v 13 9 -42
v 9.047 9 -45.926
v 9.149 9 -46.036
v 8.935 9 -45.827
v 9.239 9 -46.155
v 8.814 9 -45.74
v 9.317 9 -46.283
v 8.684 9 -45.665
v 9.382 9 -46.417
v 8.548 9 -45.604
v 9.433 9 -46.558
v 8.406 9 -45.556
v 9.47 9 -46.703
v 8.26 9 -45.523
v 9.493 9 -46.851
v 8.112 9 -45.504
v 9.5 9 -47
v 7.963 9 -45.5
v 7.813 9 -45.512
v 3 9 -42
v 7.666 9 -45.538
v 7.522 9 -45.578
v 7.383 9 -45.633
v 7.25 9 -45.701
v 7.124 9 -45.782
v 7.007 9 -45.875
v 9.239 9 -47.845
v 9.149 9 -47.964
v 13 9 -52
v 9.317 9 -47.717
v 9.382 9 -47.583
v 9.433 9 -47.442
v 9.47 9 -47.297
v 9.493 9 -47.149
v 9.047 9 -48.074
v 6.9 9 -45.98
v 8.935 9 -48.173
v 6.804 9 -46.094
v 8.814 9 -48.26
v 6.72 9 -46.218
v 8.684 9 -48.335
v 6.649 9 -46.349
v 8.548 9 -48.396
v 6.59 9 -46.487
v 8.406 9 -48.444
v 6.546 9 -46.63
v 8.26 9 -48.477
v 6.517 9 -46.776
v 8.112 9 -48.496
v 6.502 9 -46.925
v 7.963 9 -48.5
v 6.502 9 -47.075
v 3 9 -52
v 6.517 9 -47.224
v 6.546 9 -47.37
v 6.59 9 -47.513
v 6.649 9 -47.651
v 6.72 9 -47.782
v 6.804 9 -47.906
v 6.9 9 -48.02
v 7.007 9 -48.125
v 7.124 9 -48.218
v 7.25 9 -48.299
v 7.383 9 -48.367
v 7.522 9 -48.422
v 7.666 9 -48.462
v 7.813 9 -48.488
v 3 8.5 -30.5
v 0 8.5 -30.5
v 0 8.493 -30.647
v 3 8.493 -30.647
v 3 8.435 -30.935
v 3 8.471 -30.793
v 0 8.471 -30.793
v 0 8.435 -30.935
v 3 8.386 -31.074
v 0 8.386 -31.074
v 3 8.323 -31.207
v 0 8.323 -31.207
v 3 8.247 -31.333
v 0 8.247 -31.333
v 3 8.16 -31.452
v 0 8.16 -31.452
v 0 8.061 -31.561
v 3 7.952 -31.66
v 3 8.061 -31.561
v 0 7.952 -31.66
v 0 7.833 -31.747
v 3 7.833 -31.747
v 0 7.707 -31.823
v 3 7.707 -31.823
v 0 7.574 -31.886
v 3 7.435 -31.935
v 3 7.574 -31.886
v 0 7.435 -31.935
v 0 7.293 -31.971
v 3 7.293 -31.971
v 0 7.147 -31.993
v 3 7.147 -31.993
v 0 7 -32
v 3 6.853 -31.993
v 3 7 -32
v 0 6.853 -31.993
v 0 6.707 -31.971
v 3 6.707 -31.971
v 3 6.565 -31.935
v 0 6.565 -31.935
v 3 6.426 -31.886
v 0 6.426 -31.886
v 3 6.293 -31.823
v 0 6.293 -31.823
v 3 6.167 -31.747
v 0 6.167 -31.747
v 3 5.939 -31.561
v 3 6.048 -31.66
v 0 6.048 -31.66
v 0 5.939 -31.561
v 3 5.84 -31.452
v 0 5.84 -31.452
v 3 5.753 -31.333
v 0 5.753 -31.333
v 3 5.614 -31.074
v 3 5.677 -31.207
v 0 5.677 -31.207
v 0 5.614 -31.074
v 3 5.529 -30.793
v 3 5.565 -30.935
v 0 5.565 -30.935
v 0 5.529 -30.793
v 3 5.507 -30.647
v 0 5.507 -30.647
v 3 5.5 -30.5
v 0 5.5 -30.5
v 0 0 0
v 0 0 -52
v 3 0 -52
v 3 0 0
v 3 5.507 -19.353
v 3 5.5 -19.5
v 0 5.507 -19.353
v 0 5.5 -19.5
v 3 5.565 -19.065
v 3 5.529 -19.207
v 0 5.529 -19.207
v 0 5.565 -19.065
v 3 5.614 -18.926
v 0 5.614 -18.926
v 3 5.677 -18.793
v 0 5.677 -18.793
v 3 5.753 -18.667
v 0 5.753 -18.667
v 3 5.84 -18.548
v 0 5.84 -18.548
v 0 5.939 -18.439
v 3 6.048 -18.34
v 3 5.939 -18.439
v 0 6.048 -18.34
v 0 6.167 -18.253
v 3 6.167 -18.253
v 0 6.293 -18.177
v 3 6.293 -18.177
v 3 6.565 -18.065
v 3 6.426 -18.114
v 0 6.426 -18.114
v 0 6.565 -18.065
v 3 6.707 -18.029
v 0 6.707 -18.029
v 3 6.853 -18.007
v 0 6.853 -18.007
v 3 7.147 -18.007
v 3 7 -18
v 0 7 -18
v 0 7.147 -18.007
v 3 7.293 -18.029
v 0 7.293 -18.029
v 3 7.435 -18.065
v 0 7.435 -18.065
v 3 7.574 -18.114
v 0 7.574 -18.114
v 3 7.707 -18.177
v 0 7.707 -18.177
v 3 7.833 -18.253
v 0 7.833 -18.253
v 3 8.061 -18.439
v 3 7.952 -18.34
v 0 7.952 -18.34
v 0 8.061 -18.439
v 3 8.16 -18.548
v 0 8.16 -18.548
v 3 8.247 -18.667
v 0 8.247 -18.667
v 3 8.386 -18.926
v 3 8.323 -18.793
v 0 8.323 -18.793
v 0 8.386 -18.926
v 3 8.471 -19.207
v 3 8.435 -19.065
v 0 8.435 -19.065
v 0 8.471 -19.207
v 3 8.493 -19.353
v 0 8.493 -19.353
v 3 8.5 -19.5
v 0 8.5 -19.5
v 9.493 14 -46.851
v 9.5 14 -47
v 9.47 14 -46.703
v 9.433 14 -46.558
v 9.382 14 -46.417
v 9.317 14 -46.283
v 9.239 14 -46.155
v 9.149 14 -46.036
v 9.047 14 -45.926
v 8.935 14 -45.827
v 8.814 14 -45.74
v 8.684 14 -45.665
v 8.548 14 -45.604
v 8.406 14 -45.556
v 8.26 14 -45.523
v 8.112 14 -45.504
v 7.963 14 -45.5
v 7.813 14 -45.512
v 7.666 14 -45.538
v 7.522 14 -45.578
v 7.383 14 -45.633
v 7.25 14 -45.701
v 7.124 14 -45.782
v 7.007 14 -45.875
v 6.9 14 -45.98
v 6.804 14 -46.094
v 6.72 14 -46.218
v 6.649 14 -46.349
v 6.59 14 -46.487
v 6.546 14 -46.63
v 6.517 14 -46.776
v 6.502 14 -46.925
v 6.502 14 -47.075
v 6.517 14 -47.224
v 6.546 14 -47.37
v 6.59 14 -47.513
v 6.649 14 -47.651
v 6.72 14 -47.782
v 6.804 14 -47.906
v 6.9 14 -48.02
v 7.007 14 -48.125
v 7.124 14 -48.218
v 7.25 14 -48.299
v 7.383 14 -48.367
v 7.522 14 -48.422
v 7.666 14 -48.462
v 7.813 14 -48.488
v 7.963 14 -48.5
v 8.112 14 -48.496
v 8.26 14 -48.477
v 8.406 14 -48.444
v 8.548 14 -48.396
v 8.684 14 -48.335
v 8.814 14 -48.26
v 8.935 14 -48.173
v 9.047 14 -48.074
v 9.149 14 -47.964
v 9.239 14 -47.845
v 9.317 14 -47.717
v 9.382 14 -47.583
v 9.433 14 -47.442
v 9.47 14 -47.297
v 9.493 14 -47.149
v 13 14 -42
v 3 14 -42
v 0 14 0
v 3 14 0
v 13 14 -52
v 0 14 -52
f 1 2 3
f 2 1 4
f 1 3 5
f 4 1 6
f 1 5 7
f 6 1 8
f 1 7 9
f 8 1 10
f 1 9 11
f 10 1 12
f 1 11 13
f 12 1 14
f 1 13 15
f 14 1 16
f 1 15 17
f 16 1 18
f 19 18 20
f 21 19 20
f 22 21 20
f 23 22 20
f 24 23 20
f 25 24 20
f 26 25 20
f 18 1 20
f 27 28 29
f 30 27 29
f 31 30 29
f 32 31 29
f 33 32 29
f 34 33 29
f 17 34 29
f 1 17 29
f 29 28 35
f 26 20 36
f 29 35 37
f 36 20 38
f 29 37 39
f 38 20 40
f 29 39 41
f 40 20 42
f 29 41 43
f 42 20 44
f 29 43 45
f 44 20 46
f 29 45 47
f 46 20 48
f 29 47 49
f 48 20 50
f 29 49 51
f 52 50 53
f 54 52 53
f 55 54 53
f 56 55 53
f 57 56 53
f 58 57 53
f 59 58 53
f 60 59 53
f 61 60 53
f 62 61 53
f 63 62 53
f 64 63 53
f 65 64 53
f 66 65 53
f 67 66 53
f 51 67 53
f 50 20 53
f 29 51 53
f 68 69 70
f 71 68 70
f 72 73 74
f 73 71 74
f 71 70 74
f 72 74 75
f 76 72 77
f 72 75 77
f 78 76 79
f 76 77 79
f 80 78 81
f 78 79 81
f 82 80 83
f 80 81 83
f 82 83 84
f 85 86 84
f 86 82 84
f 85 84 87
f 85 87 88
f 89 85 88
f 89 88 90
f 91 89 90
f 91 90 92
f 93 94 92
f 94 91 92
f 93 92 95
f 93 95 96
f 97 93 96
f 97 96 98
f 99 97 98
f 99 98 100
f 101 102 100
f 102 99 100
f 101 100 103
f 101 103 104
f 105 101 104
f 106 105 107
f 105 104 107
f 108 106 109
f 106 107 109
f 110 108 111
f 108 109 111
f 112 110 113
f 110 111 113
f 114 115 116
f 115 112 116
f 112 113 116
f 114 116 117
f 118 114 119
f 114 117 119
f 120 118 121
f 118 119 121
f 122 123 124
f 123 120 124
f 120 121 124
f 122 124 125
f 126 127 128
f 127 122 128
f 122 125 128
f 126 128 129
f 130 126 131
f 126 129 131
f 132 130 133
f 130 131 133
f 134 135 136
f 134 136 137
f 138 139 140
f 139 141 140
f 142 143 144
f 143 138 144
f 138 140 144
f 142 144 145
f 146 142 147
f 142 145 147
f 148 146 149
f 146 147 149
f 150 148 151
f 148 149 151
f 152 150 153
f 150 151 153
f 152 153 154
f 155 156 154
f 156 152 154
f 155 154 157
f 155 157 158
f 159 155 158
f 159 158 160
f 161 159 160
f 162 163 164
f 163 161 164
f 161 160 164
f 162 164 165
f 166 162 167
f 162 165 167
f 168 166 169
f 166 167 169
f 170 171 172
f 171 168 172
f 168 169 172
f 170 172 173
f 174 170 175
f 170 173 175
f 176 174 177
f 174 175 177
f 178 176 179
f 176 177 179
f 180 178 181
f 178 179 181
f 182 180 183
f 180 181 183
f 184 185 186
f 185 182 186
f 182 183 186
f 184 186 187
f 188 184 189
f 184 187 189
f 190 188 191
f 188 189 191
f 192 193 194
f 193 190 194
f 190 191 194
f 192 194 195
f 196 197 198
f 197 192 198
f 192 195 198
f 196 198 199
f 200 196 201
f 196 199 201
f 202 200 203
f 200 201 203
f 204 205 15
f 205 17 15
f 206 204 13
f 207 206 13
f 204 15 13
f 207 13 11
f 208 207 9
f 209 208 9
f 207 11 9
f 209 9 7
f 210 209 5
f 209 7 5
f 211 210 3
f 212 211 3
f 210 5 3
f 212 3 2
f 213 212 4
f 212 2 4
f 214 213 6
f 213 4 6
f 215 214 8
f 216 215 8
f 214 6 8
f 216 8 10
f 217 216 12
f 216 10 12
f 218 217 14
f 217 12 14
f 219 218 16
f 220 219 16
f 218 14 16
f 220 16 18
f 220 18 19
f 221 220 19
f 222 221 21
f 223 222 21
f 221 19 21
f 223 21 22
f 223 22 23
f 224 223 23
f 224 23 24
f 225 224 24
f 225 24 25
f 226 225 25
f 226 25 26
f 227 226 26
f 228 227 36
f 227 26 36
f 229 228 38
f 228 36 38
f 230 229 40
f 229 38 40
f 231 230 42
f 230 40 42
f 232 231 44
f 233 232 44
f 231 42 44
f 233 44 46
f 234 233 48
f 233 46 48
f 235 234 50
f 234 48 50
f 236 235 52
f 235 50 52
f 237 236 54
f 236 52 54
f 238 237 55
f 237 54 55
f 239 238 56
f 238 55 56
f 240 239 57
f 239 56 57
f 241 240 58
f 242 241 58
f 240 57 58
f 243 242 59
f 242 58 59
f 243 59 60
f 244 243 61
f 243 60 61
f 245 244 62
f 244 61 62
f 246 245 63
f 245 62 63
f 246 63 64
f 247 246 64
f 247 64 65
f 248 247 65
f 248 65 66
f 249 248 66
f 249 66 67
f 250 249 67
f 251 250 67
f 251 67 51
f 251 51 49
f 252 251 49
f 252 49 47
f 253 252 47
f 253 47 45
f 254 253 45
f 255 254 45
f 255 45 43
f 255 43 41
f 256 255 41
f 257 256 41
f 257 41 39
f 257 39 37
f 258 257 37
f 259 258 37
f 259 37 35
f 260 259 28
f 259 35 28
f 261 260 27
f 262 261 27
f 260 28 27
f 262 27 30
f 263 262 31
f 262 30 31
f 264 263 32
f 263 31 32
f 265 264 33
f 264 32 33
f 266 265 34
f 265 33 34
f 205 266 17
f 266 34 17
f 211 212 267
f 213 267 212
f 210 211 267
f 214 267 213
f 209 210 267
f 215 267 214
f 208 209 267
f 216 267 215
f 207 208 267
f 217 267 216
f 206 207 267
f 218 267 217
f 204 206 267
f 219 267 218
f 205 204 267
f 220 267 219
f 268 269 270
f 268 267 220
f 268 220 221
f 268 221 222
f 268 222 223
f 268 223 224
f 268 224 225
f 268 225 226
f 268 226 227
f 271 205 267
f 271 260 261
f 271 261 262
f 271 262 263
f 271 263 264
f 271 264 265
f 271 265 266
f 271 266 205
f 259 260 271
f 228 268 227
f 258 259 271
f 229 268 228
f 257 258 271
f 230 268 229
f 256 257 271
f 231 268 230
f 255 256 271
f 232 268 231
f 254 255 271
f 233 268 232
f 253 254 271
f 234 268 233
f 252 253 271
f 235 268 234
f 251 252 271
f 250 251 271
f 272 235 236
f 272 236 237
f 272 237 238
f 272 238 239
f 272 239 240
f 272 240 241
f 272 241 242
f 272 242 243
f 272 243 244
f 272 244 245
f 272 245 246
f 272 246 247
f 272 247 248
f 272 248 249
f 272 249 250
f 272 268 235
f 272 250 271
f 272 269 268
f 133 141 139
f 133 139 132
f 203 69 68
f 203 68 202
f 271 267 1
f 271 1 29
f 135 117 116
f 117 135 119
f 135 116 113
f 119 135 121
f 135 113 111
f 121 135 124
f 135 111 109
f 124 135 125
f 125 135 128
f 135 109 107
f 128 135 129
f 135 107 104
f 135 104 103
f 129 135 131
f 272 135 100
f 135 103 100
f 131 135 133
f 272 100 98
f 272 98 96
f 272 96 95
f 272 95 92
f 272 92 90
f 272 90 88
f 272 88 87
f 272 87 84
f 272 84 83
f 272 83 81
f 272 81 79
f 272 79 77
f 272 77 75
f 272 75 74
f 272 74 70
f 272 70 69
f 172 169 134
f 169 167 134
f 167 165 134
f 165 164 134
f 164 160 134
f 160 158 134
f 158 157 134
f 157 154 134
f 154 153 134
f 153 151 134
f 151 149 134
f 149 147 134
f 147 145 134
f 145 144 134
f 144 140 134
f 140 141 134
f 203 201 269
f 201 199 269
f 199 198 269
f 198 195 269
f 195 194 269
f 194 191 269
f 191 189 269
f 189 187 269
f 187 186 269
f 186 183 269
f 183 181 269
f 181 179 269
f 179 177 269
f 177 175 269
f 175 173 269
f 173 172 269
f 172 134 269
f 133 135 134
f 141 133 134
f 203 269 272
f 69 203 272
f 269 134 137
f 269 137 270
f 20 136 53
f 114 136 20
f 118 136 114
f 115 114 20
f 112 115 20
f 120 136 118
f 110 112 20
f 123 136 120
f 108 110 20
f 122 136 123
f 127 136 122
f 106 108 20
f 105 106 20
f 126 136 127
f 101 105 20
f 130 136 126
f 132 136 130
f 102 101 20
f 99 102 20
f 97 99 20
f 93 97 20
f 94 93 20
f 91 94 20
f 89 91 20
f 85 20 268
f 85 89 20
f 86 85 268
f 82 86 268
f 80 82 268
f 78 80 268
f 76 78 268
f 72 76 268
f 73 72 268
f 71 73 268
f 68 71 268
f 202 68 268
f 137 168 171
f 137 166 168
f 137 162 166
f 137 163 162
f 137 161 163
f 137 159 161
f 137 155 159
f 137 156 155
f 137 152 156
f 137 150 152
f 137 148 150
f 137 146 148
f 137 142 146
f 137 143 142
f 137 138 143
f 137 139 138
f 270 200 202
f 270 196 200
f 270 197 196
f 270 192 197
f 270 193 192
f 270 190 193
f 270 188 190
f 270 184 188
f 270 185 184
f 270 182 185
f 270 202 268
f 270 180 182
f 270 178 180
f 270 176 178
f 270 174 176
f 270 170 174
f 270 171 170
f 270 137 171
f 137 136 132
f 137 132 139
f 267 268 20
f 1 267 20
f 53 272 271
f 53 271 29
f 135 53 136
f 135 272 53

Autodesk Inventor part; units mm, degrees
ref_plane "YZ Plane" through (0, 0, 0) normal (1, 0, 0) x (0, 1, 0)
ref_plane "XZ Plane" through (0, 0, 0) normal (0, 1, 0) x (-1, 0, 0)
ref_plane "XY Plane" through (0, 0, 0) normal (0, 0, 1) x (1, 0, 0)
sketch "Sketch2" plane through (0, 0, 0) normal (1, 0, 0) x (0, 1, 0)
  line L0 (0, 0) -> (14, 0)
  line L1 (14, 0) -> (14, -32)
  line L2 (14, -32) -> (0, -32) construction
  line L3 (0, -32) -> (0, 0)
  circle A0 centre (7, -25) radius 1.5
  line L4 (14, -32) -> (14, -52)
  line L5 (14, -52) -> (0, -52)
  line L6 (0, -52) -> (0, -32)
  line L7 (7, -19.5) -> (7, -30.5) construction
  line L8 (5.5, -19.5) -> (5.5, -30.5)
  line L9 (8.5, -30.5) -> (8.5, -19.5)
  arc A1 (8.5, -19.5) -> (5.5, -19.5) centre (7, -19.5) ccw
  arc A2 (5.5, -30.5) -> (8.5, -30.5) centre (7, -30.5) ccw
  point P0 (7, -32)
  dimension "d5" = 32
  dimension "d6" = 14
  dimension "d7" = 3
  dimension "d8" = 7
  dimension "d11" = 20
extrude "Extrusion1" add sketch "Sketch2" along normal blind 3
sketch "Sketch3" plane through (3, 0, 0) normal (1, 0, 0) x (0, 0, -1)
  line L0 (52, 14) -> (42, 14)
  line L1 (42, 14) -> (42, 9)
  line L2 (42, 9) -> (52, 9)
  line L3 (52, 9) -> (52, 14)
  line L4 (52, 0) -> (52, 14) projected
  line L5 (52, 14) -> (0, 14) projected
  dimension "d12" = 5
  dimension "d13" = 10
extrude "Extrusion2" add sketch "Sketch3" along normal blind 10
sketch "Sketch4" plane through (3, 9, -42) normal (0, -1, 0) x (1, 0, 0)
  circle A0 centre (5, -5) radius 1.5
  line L0 (10, 0) -> (10, -10) projected
  point P0 (-3, 42)
  point P1 (10, -5)
  dimension "d16" = 3
  dimension "d17" = 5
extrude "Extrusion3" cut sketch "Sketch4" against normal through all
properties part number "IRSensorMount"
